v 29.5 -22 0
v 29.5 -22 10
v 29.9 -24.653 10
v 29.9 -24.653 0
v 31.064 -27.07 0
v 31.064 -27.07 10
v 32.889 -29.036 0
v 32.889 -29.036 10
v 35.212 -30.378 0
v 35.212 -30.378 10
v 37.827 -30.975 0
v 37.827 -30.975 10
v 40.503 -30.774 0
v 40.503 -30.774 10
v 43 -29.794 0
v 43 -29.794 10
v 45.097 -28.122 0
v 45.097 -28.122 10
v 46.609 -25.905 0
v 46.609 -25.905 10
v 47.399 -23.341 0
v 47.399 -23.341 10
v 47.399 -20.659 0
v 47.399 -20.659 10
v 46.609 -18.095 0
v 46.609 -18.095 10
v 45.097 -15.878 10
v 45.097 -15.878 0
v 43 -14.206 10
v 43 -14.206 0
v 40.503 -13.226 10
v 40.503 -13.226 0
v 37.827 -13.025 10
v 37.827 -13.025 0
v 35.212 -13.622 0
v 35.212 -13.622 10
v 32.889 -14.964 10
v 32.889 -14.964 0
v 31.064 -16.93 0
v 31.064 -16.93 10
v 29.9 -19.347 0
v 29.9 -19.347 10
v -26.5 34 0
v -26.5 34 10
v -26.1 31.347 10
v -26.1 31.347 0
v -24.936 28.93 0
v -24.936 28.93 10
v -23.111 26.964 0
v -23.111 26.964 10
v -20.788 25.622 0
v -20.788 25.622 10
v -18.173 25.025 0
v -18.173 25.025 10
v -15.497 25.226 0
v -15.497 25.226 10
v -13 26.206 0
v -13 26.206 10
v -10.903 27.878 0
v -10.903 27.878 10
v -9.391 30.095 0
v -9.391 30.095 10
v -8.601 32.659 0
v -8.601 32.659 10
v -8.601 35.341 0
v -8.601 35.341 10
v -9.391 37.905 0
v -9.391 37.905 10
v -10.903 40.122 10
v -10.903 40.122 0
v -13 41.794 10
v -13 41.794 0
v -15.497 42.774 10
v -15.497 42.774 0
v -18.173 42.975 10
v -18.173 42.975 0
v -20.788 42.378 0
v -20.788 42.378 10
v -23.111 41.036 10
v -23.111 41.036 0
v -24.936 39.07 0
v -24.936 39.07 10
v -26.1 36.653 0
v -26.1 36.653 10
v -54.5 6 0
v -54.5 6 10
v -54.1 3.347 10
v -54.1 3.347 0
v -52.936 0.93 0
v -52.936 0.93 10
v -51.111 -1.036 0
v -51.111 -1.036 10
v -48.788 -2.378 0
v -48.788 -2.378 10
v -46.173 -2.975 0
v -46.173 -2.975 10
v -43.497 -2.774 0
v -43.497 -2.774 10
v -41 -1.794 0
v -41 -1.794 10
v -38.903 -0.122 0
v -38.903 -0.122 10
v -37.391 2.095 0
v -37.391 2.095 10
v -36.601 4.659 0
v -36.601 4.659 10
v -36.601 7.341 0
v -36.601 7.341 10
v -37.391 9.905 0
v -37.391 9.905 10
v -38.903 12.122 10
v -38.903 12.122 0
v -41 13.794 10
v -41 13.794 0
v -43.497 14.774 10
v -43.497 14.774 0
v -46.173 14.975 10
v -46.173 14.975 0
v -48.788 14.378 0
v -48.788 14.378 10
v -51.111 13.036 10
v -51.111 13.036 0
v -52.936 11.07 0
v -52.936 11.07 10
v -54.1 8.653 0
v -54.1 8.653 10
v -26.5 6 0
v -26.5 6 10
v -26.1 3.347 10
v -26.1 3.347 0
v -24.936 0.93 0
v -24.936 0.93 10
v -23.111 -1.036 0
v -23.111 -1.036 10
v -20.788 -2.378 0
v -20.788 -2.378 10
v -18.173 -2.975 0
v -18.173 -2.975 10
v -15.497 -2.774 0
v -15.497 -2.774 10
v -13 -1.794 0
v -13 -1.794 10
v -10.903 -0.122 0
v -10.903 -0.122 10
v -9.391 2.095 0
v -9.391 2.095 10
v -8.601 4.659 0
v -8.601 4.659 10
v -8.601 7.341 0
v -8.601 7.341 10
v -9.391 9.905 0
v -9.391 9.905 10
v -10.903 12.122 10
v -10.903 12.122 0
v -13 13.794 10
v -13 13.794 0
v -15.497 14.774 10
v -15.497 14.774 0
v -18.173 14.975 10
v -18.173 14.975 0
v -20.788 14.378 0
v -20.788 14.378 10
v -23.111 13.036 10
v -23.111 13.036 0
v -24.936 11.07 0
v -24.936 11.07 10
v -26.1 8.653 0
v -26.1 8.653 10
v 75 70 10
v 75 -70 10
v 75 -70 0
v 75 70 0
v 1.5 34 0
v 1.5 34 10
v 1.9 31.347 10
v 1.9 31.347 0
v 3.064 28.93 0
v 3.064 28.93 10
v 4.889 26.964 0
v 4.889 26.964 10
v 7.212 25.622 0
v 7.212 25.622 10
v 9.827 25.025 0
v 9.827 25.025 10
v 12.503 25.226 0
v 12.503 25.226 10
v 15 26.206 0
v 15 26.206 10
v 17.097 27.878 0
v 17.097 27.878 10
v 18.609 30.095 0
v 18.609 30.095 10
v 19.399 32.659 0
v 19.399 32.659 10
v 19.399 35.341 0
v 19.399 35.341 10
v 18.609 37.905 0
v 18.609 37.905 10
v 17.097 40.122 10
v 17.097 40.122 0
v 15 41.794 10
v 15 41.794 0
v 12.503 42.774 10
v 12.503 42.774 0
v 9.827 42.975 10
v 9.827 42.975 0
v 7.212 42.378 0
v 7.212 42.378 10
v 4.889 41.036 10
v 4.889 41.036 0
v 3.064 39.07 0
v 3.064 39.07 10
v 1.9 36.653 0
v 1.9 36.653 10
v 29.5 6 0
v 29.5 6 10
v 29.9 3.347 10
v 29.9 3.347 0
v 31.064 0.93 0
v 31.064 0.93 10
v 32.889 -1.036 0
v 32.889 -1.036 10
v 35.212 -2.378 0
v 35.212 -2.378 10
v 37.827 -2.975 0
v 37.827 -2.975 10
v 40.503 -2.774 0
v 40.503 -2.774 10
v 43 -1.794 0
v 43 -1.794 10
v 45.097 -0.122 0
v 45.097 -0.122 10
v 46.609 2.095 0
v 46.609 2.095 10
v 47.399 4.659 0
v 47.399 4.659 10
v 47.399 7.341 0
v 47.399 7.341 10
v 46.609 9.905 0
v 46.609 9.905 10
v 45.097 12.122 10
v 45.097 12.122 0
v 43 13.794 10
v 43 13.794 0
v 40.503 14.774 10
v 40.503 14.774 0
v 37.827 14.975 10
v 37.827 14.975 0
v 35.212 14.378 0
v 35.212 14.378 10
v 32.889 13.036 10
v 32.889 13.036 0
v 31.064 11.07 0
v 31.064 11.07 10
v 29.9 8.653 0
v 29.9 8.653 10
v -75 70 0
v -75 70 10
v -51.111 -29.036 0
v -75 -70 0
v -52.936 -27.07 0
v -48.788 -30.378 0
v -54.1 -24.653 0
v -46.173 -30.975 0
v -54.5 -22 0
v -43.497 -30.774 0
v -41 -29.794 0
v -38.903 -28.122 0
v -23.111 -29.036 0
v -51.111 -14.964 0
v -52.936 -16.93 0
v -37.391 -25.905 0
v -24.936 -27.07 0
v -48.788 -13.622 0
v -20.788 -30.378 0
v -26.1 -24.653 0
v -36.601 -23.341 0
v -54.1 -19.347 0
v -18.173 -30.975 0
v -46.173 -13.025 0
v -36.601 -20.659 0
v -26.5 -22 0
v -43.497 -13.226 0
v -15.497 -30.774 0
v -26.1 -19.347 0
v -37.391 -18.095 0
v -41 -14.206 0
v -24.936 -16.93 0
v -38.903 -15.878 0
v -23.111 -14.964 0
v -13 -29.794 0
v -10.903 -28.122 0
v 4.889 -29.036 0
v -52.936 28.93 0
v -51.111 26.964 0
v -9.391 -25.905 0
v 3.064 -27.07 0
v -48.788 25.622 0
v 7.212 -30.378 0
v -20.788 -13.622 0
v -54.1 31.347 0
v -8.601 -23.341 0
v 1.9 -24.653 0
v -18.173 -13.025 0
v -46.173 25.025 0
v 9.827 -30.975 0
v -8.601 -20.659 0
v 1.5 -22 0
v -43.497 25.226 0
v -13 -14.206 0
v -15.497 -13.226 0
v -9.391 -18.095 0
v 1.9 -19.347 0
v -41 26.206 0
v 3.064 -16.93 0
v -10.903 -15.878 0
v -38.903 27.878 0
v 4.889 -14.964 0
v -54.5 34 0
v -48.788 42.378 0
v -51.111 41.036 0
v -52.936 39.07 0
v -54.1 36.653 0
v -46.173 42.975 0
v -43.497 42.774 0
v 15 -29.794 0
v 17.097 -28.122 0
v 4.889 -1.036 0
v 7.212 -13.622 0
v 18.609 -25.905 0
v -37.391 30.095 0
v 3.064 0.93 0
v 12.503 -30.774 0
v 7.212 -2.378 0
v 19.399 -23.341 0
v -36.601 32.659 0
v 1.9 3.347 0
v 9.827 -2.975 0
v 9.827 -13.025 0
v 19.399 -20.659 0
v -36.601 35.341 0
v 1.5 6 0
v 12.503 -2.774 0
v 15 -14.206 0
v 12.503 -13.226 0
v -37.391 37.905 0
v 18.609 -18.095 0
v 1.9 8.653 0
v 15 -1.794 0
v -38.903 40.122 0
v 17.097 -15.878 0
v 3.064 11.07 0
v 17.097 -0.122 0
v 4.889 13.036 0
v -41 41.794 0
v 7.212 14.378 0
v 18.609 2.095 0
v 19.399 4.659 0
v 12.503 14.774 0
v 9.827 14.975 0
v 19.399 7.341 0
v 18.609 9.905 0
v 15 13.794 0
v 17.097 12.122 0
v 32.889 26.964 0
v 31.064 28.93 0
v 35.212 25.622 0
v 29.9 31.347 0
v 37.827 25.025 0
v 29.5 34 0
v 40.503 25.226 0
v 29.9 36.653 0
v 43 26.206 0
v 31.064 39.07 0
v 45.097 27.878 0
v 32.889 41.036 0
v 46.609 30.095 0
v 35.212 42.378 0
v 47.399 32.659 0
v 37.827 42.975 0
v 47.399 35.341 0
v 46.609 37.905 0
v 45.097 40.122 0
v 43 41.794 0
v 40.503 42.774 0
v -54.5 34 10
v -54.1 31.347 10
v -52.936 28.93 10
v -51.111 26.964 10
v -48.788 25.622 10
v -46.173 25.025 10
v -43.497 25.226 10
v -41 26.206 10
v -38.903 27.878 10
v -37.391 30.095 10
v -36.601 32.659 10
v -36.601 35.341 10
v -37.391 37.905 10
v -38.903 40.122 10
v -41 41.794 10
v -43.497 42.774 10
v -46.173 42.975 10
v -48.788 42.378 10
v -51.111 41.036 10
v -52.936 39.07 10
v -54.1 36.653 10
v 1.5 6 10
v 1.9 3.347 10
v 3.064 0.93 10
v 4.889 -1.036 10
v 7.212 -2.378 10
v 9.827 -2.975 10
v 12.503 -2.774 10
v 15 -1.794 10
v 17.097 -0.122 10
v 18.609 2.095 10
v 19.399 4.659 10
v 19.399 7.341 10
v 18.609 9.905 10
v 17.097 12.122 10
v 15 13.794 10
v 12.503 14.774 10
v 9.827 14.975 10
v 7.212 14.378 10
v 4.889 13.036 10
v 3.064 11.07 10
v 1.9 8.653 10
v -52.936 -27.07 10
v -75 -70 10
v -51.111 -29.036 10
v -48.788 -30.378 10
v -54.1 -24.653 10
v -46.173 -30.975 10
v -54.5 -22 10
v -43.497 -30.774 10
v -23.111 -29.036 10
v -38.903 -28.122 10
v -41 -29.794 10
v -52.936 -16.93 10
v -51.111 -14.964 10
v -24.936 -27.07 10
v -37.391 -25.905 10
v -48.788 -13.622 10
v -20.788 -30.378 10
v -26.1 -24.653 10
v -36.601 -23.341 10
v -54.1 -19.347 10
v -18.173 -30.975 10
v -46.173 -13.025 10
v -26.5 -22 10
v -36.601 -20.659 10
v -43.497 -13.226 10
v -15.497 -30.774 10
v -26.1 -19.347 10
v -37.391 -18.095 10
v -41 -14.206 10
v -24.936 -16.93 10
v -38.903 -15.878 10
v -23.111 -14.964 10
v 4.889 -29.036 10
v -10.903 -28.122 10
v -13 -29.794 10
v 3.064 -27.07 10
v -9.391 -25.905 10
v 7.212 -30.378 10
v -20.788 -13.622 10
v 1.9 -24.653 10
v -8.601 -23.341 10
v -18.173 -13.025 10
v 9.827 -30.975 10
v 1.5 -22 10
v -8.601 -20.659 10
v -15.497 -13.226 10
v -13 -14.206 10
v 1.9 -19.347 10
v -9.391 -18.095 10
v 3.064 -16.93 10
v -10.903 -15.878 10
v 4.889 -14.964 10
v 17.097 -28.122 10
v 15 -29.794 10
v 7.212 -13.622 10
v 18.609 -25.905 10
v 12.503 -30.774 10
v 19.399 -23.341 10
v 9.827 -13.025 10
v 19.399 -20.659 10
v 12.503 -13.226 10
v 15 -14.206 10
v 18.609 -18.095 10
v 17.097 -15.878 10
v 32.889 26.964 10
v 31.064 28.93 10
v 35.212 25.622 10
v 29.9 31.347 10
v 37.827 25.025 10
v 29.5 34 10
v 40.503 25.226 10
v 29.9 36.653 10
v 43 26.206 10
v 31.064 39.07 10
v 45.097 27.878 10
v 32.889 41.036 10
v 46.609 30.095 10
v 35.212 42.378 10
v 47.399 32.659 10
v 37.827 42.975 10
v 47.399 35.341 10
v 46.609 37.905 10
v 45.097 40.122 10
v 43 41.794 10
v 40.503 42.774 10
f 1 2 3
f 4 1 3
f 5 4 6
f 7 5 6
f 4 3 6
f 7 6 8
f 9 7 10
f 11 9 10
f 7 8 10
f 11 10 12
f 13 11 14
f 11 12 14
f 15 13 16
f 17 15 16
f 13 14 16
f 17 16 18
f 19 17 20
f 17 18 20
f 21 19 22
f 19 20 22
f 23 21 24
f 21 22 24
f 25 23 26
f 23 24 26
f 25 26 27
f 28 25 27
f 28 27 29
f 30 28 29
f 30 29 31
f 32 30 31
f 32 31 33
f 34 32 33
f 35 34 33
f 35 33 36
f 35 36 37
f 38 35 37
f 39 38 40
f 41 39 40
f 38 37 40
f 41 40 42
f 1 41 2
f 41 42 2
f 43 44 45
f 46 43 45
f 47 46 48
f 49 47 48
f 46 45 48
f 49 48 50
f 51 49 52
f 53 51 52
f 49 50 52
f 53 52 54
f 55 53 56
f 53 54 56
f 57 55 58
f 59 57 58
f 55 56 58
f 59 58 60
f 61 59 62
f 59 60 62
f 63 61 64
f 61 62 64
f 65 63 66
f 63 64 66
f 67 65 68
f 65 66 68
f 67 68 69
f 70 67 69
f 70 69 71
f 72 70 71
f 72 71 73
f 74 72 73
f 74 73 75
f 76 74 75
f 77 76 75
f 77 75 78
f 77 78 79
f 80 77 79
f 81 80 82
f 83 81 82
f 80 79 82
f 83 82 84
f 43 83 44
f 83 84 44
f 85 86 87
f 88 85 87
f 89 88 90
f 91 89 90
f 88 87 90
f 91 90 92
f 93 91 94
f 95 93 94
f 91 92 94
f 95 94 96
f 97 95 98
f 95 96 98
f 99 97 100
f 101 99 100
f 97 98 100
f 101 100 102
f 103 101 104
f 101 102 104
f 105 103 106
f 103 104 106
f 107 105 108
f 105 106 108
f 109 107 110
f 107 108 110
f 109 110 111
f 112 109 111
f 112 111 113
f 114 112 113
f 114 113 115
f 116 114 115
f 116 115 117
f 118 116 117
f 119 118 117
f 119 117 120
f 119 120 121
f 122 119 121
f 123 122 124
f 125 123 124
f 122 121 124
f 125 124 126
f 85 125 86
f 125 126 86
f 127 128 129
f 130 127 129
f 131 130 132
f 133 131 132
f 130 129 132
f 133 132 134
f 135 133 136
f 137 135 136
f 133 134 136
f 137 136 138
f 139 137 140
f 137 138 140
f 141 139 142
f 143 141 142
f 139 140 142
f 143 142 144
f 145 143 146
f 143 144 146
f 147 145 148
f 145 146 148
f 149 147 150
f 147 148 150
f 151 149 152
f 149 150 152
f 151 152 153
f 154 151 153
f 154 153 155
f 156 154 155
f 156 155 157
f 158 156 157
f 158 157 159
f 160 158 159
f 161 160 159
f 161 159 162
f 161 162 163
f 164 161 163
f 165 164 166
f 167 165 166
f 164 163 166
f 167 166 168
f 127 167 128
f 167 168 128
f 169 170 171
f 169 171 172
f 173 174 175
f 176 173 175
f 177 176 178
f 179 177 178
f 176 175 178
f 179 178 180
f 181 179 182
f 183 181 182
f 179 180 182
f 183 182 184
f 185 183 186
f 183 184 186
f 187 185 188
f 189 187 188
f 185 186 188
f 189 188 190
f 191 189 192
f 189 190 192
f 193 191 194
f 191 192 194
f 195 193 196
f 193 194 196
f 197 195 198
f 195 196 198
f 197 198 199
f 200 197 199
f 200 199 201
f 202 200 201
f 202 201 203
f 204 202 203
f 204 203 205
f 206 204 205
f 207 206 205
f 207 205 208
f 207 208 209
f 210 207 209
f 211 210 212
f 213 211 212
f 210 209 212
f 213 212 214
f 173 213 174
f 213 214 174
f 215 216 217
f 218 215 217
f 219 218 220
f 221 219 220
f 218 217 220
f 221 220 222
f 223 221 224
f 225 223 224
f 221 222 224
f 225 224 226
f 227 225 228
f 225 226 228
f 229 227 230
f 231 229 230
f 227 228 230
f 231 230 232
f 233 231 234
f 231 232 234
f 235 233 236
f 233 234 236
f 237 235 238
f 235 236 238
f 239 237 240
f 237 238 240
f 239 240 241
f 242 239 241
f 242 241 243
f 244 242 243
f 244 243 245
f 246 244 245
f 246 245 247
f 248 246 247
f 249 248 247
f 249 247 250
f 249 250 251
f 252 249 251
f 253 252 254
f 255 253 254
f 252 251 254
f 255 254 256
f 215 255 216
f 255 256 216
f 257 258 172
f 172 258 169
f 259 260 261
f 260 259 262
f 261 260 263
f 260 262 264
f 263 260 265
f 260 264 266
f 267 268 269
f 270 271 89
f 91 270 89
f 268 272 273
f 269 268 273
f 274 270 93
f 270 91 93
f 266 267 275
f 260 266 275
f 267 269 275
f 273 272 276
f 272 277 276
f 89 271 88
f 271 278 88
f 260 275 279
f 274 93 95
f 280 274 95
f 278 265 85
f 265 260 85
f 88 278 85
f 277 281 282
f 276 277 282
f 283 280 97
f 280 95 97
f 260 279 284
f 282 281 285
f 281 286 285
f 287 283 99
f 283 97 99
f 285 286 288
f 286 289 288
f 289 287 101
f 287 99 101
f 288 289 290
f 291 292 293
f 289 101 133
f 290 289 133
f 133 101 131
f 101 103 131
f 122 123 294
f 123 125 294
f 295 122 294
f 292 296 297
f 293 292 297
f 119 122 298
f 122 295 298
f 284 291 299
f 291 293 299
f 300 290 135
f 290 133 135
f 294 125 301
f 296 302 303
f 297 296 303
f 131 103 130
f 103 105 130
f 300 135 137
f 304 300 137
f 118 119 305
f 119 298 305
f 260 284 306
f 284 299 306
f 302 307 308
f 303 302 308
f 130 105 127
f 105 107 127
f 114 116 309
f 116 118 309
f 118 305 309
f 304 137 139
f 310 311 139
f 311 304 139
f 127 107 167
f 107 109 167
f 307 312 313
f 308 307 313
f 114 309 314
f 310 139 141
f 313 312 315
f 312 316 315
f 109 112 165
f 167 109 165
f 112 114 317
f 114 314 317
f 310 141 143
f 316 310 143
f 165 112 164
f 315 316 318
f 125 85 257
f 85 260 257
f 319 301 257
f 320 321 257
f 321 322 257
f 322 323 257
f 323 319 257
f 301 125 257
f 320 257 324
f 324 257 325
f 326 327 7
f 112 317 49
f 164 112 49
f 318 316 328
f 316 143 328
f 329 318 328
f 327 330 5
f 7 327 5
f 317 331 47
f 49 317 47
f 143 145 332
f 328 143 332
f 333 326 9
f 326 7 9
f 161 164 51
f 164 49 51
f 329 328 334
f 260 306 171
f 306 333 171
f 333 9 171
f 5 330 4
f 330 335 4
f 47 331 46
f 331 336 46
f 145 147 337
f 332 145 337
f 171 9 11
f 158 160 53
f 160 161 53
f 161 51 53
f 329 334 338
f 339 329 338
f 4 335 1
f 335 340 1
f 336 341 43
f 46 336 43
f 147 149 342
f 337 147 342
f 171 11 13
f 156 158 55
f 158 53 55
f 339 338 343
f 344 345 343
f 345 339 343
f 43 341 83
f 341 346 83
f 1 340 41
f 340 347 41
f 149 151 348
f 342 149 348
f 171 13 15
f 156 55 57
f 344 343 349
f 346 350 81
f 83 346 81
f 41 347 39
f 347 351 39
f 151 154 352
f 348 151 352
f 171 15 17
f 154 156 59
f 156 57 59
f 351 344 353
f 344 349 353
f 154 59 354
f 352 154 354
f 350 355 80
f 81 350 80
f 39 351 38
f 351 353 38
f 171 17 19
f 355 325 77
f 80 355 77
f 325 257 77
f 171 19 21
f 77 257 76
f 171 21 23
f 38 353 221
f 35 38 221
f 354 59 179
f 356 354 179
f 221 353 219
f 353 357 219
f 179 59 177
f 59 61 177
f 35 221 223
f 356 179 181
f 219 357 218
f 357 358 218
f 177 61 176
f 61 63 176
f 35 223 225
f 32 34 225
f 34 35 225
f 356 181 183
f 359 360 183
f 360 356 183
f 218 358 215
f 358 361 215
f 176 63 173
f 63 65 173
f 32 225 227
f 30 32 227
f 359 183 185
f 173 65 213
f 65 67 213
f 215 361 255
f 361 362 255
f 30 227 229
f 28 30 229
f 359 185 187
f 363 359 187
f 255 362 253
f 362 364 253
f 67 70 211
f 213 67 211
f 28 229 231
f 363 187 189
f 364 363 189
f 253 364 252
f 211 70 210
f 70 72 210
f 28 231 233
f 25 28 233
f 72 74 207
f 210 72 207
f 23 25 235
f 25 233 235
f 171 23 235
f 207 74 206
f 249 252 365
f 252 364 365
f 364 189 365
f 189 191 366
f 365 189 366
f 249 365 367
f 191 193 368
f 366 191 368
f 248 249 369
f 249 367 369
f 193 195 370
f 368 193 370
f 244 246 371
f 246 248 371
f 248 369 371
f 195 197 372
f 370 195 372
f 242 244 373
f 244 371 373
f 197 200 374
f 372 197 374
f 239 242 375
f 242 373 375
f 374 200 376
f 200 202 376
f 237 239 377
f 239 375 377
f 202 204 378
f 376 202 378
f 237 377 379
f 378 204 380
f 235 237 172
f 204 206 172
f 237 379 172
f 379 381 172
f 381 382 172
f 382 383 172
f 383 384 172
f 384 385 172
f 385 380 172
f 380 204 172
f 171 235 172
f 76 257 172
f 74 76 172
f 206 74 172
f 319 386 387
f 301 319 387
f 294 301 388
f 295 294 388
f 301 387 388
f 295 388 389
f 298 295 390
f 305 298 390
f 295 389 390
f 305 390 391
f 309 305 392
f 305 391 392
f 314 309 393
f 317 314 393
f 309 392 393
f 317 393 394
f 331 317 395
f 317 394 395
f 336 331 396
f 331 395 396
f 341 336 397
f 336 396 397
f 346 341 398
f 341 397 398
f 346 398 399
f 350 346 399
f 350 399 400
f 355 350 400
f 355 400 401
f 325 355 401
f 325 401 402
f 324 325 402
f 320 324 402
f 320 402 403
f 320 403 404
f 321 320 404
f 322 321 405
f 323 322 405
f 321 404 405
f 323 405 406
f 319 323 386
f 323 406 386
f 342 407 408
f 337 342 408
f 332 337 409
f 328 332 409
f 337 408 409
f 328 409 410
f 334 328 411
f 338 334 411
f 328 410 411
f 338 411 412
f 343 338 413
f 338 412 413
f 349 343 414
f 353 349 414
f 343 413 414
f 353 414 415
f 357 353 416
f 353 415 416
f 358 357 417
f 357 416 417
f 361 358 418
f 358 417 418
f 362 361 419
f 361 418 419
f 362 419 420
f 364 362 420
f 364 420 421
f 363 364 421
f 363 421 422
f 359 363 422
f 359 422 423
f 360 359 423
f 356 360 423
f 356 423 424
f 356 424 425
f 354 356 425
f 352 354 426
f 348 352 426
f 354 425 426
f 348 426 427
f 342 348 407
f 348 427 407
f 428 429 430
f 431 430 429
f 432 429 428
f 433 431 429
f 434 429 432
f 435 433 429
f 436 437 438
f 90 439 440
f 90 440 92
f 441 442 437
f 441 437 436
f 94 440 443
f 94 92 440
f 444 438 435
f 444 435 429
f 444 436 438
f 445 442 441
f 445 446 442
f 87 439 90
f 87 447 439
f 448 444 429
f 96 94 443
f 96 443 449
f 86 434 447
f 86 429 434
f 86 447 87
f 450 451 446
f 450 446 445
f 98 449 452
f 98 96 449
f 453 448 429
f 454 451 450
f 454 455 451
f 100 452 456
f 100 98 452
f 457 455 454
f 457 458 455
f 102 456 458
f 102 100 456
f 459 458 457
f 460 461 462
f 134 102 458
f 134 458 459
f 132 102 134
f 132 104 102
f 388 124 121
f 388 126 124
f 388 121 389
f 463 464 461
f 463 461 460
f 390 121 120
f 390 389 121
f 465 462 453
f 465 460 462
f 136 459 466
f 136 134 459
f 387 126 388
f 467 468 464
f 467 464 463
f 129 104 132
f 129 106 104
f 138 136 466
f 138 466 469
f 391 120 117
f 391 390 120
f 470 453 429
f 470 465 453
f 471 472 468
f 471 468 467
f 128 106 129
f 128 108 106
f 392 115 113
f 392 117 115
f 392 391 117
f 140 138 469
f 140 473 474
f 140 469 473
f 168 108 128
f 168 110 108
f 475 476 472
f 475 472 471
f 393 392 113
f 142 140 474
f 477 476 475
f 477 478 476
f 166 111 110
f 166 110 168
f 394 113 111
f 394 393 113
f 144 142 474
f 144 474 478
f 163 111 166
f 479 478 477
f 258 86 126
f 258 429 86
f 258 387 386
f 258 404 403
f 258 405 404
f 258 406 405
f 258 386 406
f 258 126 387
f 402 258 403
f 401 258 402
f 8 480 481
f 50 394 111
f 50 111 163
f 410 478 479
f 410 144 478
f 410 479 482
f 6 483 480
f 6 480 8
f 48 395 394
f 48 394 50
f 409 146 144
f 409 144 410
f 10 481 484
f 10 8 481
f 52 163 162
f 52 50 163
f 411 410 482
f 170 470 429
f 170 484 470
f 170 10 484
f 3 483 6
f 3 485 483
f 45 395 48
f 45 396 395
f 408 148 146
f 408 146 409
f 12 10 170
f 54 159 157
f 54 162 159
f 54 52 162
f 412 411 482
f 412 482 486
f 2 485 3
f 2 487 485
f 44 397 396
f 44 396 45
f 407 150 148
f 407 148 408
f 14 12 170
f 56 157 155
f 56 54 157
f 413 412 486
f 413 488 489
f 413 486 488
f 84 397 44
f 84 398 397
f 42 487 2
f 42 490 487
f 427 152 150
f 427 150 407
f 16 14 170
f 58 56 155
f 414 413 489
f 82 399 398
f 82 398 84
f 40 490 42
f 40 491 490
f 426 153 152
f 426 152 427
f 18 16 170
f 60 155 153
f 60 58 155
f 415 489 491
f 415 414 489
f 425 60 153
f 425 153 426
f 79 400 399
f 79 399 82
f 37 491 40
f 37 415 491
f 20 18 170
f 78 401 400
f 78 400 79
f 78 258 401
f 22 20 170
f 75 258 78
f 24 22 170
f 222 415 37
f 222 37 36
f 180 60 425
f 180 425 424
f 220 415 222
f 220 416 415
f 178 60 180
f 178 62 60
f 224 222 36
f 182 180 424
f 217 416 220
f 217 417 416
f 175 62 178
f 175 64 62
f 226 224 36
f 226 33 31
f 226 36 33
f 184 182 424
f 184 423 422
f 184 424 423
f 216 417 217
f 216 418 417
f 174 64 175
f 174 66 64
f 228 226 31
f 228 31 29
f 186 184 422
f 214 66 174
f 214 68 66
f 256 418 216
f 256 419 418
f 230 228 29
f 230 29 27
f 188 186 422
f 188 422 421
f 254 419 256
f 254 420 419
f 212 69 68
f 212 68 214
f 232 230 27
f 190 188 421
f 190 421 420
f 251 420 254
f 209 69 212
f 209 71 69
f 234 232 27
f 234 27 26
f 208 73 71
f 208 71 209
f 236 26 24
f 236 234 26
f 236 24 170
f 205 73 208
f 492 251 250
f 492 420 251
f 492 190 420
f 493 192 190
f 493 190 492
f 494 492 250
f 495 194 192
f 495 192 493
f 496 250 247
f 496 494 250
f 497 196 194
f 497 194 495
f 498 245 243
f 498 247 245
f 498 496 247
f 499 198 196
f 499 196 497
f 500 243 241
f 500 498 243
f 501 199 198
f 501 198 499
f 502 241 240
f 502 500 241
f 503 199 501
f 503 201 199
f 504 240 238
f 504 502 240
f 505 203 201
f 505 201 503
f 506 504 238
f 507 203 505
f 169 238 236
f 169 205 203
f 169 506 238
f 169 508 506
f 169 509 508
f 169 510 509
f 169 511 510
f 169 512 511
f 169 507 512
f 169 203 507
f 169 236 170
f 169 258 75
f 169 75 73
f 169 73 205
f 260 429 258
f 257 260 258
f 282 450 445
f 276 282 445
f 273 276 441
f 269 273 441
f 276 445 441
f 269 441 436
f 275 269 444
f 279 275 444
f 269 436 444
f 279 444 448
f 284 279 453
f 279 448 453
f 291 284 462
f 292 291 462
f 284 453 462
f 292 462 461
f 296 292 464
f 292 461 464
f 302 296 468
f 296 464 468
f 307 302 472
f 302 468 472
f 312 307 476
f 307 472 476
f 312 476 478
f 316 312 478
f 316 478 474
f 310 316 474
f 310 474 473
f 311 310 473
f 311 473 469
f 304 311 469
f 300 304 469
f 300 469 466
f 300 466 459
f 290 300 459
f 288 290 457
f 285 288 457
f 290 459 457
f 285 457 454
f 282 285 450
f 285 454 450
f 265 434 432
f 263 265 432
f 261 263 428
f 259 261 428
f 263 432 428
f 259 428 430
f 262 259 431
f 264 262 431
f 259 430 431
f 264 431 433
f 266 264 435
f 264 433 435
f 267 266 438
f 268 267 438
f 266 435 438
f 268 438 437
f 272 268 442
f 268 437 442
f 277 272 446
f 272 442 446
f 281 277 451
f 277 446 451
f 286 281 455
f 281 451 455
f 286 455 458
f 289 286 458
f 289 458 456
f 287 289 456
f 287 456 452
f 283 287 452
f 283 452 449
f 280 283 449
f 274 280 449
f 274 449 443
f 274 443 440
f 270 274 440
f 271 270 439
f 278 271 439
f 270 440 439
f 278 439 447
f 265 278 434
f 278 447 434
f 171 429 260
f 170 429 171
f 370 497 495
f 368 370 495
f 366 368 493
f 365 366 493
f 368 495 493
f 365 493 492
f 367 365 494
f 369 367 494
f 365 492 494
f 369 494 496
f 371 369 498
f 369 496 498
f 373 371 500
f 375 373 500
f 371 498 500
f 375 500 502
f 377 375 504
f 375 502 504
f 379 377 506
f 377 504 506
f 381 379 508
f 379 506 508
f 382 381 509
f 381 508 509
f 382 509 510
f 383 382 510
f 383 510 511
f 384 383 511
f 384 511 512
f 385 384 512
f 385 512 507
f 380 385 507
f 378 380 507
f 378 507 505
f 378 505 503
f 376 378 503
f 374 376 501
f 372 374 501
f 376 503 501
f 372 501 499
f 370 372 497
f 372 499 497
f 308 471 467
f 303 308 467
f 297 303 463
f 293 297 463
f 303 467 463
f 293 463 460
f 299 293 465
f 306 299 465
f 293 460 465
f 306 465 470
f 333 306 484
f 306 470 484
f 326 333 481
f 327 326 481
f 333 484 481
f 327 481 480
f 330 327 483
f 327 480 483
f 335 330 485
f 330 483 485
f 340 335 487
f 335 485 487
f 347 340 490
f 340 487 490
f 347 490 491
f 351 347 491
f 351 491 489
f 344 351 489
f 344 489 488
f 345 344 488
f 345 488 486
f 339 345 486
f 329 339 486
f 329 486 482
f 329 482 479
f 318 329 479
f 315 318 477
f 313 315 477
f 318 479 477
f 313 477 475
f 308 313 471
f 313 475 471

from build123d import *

# Parameters (mm, degrees)
SKETCH1_W           = 150
SKETCH1_H           = 140
SKETCH1_R           = 9
BOSS_EXTRUDE1_DEPTH = 10


with BuildPart() as part:
    # Sketch1 → Boss-Extrude1 (new body)
    with BuildSketch(Plane.XY.offset(10)):
        Rectangle(SKETCH1_W, SKETCH1_H)
        with Locations(Location((-17.5, -22, 0), (0, 0, 180))):
            Circle(SKETCH1_R, mode=Mode.SUBTRACT)
        with Locations(Location((-45.5, -22, 0), (0, 0, 180))):
            Circle(SKETCH1_R, mode=Mode.SUBTRACT)
        with Locations(Location((10.5, -22, 0), (0, 0, 180))):
            Circle(SKETCH1_R, mode=Mode.SUBTRACT)
        with Locations(Location((38.5, -22, 0), (0, 0, 180))):
            Circle(SKETCH1_R, mode=Mode.SUBTRACT)
        with Locations(Location((-45.5, 6, 0), (0, 0, 180))):
            Circle(SKETCH1_R, mode=Mode.SUBTRACT)
        with Locations(Location((-17.5, 6, 0), (0, 0, 180))):
            Circle(SKETCH1_R, mode=Mode.SUBTRACT)
        with Locations(Location((10.5, 6, 0), (0, 0, 180))):
            Circle(SKETCH1_R, mode=Mode.SUBTRACT)
        with Locations(Location((38.5, 6, 0), (0, 0, 180))):
            Circle(SKETCH1_R, mode=Mode.SUBTRACT)
        with Locations(Location((-45.5, 34, 0), (0, 0, 180))):
            Circle(SKETCH1_R, mode=Mode.SUBTRACT)
        with Locations(Location((-17.5, 34, 0), (0, 0, 180))):
            Circle(SKETCH1_R, mode=Mode.SUBTRACT)
        with Locations(Location((10.5, 34, 0), (0, 0, 180))):
            Circle(SKETCH1_R, mode=Mode.SUBTRACT)
        with Locations(Location((38.5, 34, 0), (0, 0, 180))):
            Circle(SKETCH1_R, mode=Mode.SUBTRACT)
    extrude(amount=-BOSS_EXTRUDE1_DEPTH)


solid = part.part
